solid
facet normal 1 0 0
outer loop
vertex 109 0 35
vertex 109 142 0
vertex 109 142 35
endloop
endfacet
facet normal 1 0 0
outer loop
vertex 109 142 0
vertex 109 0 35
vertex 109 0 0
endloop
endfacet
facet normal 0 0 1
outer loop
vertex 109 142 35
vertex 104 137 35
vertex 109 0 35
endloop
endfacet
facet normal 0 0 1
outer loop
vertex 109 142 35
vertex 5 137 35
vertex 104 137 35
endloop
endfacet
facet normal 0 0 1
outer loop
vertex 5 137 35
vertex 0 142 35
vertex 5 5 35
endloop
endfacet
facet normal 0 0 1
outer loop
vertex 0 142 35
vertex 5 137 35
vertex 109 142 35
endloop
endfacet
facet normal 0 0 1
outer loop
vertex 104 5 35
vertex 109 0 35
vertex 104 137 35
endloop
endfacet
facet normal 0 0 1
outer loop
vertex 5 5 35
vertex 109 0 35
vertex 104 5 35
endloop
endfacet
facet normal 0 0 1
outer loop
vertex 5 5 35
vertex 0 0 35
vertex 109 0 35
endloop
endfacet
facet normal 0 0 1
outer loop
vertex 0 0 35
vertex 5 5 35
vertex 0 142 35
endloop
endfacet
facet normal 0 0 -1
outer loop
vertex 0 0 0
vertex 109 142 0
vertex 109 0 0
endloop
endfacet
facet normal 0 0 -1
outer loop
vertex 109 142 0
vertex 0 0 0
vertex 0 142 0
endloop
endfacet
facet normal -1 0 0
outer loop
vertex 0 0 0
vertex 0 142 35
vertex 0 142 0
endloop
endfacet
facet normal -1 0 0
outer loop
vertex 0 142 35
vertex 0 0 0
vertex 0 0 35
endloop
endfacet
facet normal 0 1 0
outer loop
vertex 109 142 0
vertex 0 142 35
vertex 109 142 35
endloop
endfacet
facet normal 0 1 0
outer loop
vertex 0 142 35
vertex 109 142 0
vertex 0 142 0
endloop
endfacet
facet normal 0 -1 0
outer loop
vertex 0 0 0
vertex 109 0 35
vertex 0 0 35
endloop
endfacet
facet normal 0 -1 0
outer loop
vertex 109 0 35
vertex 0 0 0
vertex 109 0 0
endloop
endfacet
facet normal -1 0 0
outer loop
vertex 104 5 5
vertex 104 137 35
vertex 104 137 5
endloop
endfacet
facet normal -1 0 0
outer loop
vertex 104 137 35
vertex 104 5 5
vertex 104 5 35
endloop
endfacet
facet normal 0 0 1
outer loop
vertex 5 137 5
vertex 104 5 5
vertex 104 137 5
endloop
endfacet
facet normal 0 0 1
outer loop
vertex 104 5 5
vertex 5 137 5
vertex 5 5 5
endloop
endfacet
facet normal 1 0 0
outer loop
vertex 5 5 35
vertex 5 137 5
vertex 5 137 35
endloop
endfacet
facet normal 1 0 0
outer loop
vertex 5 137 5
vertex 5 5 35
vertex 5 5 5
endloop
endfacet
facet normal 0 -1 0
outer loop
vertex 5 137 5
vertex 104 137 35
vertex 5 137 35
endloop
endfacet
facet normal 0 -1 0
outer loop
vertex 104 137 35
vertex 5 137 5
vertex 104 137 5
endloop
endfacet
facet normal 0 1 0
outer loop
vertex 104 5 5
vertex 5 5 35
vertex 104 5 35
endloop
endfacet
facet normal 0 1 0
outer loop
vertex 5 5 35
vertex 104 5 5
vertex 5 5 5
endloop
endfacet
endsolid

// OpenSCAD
ledge = 5;
padding = 5;

total_acorns = 12;
acorn_width = 28;
acorn_height = 20;

total_rows = 3;
total_cols = total_acorns/total_rows;

cutout_width = (acorn_width + padding) * total_rows;
cutout_depth = (acorn_width + padding) * total_cols;
cutout_height = acorn_height + padding;


difference() {
  cube([cutout_width+(ledge*2), cutout_depth+(ledge*2), cutout_height+(ledge*2)]);

  translate([ledge, ledge, ledge]) {
    color("red") cube([cutout_width, cutout_depth, cutout_height+(ledge*2)]);
  };
}
